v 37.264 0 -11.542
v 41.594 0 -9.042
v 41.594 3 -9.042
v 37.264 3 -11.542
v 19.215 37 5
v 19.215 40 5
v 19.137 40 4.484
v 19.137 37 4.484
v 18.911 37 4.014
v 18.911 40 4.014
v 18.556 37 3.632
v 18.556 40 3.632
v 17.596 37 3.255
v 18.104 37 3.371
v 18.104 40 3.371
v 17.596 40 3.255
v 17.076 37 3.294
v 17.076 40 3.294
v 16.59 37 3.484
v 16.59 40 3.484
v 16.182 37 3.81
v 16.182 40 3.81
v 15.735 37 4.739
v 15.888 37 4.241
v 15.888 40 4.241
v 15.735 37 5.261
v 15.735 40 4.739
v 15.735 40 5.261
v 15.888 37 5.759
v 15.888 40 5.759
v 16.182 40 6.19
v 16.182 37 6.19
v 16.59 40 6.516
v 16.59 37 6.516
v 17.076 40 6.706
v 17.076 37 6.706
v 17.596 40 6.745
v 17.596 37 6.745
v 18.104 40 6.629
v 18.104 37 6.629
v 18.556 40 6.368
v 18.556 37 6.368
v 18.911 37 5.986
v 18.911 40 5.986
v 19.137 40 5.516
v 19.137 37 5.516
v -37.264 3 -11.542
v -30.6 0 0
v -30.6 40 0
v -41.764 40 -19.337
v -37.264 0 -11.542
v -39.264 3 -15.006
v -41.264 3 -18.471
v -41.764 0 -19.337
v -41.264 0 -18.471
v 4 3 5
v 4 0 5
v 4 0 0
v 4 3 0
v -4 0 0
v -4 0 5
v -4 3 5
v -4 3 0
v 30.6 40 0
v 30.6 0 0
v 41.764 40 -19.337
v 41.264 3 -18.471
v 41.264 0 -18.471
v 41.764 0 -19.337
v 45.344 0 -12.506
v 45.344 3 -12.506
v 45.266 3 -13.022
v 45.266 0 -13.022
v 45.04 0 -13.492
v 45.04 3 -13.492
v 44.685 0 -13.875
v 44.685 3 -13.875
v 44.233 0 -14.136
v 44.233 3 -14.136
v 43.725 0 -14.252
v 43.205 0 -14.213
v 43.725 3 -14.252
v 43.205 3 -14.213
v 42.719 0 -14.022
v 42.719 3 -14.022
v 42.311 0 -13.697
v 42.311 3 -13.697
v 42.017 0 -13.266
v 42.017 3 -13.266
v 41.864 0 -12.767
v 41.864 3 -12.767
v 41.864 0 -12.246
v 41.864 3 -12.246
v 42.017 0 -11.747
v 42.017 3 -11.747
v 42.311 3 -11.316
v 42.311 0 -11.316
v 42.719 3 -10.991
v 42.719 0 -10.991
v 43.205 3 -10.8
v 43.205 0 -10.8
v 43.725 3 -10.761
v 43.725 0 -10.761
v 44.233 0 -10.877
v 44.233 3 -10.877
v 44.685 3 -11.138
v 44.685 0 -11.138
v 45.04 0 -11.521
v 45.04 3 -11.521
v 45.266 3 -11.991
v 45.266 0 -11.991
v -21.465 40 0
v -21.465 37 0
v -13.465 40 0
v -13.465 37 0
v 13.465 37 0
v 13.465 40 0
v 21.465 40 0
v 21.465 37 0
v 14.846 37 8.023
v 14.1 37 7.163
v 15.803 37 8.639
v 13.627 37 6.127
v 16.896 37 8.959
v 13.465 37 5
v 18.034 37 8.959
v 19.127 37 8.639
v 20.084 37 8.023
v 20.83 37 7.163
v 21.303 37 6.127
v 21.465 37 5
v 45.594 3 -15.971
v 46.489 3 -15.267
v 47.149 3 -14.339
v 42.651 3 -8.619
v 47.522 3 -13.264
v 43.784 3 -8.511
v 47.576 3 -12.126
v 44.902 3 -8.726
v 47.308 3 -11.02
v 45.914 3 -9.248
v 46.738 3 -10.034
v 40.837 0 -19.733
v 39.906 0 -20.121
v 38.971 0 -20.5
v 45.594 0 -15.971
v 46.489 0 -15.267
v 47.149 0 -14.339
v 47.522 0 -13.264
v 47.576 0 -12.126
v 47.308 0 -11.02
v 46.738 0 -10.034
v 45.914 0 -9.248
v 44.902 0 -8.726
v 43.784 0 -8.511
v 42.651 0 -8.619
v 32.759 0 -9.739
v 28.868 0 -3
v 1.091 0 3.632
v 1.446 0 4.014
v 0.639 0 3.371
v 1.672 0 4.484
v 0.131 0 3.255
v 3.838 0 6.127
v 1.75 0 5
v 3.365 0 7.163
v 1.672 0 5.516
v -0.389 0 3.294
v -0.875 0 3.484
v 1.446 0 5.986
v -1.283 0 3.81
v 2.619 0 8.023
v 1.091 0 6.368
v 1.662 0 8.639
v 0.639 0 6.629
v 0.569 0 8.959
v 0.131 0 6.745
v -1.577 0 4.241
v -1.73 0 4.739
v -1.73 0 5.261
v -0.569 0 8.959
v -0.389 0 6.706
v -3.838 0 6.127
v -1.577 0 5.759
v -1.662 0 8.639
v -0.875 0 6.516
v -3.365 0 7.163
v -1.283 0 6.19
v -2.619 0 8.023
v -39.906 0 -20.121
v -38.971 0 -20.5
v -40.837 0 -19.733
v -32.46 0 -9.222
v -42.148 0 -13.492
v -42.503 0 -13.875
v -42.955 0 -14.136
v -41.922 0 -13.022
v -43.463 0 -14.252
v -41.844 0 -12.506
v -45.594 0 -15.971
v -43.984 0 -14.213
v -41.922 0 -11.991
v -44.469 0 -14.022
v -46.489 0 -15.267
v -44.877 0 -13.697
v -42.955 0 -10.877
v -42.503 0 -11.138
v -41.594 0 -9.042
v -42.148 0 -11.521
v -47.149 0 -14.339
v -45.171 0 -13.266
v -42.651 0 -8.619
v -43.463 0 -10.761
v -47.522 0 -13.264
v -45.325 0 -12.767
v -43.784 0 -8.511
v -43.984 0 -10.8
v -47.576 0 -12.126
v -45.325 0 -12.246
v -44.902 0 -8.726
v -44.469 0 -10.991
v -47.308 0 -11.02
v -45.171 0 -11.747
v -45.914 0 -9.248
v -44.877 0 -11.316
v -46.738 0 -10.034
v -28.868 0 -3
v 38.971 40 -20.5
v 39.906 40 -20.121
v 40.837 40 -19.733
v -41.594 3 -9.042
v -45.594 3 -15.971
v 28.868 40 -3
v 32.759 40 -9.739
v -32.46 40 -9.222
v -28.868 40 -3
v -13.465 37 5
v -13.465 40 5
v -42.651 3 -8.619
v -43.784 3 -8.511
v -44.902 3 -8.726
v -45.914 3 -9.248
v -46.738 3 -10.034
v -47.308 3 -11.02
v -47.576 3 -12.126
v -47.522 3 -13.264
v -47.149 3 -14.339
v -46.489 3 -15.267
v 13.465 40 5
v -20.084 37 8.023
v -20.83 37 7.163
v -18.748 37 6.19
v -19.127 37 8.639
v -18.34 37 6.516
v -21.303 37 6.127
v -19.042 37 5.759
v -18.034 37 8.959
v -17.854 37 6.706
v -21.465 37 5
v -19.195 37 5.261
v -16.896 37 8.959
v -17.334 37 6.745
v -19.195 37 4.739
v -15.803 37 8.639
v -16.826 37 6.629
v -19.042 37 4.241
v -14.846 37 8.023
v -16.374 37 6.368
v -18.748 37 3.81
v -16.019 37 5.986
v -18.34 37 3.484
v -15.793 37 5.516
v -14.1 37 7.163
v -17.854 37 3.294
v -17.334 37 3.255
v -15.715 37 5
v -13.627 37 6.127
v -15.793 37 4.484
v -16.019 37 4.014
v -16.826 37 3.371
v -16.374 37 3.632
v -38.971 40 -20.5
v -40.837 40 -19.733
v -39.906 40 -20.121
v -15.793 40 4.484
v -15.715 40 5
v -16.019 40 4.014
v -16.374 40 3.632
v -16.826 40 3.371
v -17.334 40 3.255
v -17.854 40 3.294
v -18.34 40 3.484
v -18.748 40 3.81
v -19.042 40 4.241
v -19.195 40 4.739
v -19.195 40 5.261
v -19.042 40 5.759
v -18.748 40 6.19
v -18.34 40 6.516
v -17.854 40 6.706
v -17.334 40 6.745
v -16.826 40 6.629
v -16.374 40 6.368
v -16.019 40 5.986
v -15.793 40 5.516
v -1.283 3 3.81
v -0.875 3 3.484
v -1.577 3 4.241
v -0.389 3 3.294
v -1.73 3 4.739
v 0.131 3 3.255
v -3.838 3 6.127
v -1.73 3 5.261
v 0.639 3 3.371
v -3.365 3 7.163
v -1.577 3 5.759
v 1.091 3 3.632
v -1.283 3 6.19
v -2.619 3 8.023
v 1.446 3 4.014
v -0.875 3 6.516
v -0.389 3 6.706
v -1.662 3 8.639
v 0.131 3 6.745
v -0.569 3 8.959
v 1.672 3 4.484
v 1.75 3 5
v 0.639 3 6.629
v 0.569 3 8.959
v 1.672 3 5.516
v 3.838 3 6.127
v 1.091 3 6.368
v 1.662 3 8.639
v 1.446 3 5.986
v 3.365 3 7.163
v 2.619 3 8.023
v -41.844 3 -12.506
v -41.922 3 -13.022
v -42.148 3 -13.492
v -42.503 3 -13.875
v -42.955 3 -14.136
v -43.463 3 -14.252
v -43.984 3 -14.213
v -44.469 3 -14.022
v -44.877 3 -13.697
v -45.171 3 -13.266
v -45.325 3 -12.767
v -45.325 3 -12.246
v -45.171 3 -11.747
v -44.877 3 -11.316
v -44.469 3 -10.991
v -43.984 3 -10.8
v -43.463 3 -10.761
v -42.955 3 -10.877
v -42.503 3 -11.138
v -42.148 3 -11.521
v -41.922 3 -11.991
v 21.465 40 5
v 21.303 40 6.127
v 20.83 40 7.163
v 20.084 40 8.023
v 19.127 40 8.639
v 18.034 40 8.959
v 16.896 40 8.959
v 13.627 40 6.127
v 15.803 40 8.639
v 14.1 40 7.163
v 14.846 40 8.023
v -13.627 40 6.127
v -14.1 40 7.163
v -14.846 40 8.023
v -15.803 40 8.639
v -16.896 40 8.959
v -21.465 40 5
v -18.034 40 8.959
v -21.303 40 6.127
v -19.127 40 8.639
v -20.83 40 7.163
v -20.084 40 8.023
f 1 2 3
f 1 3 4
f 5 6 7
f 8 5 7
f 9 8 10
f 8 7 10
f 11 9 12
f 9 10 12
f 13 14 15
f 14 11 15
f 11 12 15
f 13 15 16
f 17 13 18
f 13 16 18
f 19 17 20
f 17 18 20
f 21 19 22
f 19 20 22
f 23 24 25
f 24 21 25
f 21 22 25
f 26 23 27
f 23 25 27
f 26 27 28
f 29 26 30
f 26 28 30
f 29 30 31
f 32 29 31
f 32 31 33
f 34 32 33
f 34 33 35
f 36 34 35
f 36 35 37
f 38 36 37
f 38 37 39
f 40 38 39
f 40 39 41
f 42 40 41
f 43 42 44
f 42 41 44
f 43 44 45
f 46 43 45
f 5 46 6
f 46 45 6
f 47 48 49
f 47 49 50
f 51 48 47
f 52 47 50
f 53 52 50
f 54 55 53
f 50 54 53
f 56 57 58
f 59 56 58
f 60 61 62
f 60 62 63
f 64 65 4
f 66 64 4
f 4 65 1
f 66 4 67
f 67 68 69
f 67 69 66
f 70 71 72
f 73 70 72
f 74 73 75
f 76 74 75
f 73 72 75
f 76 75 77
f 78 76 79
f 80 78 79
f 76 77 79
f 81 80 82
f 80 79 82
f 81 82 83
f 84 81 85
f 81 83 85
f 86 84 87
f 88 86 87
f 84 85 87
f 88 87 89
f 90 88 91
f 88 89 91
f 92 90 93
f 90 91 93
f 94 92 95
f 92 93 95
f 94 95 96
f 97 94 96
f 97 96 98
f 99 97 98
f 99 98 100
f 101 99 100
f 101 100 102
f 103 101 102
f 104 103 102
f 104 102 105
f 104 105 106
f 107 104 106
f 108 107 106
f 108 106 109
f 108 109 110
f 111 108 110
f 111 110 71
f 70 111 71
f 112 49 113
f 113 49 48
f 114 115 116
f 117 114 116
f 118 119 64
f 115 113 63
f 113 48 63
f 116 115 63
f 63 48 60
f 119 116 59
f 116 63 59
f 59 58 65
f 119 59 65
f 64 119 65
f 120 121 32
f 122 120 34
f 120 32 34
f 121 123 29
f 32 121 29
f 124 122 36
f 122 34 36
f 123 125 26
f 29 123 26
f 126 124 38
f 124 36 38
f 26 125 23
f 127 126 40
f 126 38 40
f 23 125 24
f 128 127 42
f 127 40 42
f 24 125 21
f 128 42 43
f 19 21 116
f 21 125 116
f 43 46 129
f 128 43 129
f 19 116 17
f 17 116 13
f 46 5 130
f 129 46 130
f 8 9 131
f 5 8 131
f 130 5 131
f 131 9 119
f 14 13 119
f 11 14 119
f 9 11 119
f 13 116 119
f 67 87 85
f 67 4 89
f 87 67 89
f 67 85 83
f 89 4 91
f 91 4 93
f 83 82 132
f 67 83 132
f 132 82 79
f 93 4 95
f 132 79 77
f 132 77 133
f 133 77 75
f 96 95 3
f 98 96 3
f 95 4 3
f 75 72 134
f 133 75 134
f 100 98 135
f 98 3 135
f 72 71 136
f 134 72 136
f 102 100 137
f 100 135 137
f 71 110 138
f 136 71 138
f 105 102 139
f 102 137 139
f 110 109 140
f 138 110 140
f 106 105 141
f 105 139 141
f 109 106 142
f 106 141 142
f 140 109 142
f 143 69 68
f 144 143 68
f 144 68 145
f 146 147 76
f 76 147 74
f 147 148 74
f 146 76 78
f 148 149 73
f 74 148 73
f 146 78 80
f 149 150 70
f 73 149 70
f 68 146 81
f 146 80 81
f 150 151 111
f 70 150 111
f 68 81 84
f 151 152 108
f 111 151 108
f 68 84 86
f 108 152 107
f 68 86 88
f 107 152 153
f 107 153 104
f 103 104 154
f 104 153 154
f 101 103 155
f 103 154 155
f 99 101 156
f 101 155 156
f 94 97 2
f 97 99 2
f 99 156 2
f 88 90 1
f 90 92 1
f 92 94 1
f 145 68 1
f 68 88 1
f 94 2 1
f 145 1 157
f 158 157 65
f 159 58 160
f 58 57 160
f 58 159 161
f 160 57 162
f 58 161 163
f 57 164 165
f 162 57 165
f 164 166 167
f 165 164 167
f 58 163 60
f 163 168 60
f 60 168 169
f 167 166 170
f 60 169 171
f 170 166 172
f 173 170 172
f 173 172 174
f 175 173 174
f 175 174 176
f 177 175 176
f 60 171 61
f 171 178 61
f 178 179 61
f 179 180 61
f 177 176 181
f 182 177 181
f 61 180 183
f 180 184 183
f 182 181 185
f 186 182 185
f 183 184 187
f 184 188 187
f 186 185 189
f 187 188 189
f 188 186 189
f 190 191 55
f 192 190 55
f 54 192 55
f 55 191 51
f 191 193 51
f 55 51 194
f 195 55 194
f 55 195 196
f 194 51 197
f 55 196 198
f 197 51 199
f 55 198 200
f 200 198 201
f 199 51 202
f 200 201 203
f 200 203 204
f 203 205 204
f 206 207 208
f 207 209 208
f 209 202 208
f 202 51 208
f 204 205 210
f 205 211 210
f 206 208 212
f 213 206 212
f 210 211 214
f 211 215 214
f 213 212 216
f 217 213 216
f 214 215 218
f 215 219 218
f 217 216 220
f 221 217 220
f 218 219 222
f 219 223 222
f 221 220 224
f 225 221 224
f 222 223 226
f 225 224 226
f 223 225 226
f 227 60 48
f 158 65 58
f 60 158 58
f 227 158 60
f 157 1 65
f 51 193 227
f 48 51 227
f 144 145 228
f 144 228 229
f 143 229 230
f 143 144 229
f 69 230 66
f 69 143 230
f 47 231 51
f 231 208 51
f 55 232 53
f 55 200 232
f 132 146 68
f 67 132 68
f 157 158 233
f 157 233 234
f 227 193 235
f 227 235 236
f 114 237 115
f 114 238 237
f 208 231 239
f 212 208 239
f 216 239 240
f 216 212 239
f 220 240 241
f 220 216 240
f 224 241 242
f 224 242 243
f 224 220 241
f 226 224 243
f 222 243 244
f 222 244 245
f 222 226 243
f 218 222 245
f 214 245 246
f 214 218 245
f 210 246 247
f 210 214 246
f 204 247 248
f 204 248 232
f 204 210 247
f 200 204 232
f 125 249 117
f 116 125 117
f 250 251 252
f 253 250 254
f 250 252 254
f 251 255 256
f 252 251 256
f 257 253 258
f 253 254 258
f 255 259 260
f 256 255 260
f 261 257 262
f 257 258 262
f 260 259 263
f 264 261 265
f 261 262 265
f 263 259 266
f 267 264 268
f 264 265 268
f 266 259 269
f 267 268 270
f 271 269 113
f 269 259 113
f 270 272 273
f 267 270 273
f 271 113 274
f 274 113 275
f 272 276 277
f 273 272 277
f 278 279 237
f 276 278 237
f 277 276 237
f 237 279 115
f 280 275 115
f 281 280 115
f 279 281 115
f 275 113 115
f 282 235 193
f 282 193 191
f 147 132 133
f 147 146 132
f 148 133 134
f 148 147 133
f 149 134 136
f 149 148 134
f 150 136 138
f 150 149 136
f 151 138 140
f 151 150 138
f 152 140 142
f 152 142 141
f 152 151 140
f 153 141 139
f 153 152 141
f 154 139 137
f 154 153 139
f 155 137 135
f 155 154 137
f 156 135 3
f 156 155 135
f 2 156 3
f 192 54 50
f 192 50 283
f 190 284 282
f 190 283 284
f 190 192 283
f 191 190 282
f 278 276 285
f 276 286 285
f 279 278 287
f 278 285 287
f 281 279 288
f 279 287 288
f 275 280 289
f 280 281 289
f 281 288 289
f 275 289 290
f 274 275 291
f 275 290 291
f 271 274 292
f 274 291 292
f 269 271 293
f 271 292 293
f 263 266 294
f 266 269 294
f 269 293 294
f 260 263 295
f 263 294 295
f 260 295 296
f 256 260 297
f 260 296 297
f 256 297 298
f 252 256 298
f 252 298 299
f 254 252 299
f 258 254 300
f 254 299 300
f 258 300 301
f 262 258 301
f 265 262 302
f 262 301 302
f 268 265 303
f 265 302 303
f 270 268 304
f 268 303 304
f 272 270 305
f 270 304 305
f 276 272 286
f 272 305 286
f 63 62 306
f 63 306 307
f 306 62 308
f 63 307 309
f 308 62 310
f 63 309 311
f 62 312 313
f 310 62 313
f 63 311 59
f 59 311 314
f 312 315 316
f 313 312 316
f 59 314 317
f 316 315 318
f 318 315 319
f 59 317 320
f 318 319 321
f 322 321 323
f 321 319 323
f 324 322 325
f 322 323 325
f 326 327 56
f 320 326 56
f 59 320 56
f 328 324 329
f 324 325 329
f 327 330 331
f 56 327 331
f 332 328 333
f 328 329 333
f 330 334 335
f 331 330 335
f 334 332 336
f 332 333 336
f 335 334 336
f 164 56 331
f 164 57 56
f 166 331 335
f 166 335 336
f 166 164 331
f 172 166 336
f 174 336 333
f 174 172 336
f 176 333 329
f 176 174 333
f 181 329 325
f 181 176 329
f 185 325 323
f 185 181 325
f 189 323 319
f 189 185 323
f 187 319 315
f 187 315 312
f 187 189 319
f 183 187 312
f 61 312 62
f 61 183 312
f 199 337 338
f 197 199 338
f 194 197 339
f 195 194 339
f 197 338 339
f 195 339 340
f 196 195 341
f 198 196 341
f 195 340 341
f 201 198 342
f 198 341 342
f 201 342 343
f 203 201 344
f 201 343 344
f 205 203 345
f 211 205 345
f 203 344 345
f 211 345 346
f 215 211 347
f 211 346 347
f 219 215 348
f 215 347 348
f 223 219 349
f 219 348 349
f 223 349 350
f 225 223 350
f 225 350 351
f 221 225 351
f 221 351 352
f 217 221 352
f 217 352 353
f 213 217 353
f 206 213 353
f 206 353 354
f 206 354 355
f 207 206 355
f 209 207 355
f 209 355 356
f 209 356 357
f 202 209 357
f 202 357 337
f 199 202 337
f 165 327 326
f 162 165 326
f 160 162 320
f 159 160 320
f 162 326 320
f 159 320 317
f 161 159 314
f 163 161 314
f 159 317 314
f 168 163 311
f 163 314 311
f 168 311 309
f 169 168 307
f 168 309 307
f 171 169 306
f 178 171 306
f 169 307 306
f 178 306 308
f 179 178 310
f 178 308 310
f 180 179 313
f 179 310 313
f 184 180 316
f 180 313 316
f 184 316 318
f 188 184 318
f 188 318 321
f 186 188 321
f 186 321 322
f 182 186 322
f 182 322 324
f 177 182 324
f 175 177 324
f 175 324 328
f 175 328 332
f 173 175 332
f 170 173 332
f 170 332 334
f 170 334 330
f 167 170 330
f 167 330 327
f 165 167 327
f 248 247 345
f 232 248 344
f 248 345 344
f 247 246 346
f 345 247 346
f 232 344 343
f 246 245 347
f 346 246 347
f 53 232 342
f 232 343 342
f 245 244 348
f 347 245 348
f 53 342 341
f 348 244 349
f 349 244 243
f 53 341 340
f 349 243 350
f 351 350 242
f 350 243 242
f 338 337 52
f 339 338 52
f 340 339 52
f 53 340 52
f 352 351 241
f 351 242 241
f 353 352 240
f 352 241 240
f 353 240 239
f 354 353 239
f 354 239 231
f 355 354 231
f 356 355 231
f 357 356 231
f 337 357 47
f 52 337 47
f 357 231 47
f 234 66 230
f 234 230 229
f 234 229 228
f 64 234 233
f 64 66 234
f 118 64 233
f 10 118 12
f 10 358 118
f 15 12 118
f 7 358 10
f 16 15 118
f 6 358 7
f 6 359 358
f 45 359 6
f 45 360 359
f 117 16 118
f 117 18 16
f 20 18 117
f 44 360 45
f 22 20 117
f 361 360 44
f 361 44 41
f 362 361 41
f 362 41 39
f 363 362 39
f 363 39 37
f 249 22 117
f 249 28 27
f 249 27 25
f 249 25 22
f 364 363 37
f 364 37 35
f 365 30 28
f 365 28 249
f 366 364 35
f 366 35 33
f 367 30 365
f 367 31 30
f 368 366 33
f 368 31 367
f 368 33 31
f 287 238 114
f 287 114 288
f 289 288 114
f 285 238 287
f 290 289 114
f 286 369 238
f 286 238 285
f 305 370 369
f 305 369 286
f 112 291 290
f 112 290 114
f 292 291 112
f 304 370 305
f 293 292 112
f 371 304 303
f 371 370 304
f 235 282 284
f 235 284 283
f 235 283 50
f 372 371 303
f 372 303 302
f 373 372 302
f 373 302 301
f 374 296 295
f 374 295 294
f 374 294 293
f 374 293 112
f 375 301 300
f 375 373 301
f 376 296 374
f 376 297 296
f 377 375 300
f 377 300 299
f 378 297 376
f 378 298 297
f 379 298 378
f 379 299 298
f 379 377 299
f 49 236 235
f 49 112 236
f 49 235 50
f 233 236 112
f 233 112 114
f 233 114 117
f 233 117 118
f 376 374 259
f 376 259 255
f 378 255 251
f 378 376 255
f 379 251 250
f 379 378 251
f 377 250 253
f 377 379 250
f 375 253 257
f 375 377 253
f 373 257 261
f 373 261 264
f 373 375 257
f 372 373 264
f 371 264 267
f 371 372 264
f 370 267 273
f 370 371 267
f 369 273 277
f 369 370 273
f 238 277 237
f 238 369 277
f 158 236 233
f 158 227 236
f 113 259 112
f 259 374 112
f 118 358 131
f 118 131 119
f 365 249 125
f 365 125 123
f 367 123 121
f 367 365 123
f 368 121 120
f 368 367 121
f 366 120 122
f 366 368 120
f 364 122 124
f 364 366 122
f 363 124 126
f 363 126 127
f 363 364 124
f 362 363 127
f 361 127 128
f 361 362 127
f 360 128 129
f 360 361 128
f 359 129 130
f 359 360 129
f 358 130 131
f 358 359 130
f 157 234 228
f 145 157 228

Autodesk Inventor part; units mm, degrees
ref_plane "YZ Plane" through (0, 0, 0) normal (1, 0, 0) x (0, 1, 0)
ref_plane "XZ Plane" through (0, 0, 0) normal (0, 1, 0) x (-1, 0, 0)
ref_plane "XY Plane" through (0, 0, 0) normal (0, 0, 1) x (1, 0, 0)
sketch "Sketch1" plane through (0, 0, 0) normal (0, 1, 0) x (-1, 0, 0)
  line L0 (0, 0) -> (-30.6, 0)
  line L1 (0, 0) -> (30.6, 0)
  line L2 (30.6, 0) -> (41.764, -19.3366)
  line L3 (30.6, 0) -> (52.928, 0) construction
  line L4 (-30.6, 0) -> (-41.764, -19.3366)
  line L5 (-30.6, 0) -> (-8.272, 0) construction
  line L6 (0, 0) -> (0, 77)
  line L7 (0, 0) -> (0, -3)
  line L8 (-35.3569, -8.2392) -> (-32.7588, -9.7392)
  line L9 (35.0582, -7.7219) -> (32.4602, -9.2219)
  line L10 (32.4602, -9.2219) -> (28.8679, -3)
  line L11 (28.8679, -3) -> (0, -3)
  line L12 (0, -3) -> (-28.8679, -3)
  line L13 (-28.8679, -3) -> (-32.7588, -9.7392)
  line L14 (-32.7588, -9.7392) -> (-38.9714, -20.4998)
  line L15 (32.4602, -9.2219) -> (38.9714, -20.4998)
  arc A0 (38.9714, -20.4998) -> (41.764, -19.3366) centre (0, 77) ccw
  arc A1 (-41.764, -19.3366) -> (-38.9714, -20.4998) centre (0, 77) ccw
  dimension "d0" = 30.6
  dimension "d1" = 30.6
  dimension "d2" = 22.328
  dimension "d3" = 60
  dimension "d4" = 22.328
  dimension "d5" = 120
  dimension "d6" = 77
  dimension "d7" = 3
  dimension "d8" = 3
  dimension "d9" = 3
extrude "Extrusion1" add sketch "Sketch1" along normal blind 40
sketch "Sketch2" plane through (0, 0, 0) normal (0, -1, 0) x (1, 0, 0)
  line L0 (0, 0) -> (0, 5)
  circle A0 centre (0, 5) radius 1.5
  line L1 (-41.764, -19.3366) -> (-39.264, -15.0065)
  line L2 (-41.764, -19.3366) -> (-30.6, 0) projected
  line L3 (-39.264, -15.0065) -> (-43.5941, -12.5065)
  arc A1 (38.9714, -20.4998) -> (41.764, -19.3366) centre (0, 77) ccw projected
  line L4 (38.9714, -20.4998) -> (39.264, -15.0065)
  line L5 (30.6, 0) -> (41.764, -19.3366) projected
  line L6 (41.764, -19.3366) -> (39.264, -15.0065)
  line L7 (39.264, -15.0065) -> (43.5941, -12.5065)
  circle A2 centre (43.5941, -12.5065) radius 1.5
  circle A3 centre (-43.5941, -12.5065) radius 1.5
  circle A4 centre (-43.5941, -12.5065) radius 4
  circle A5 centre (0, 5) radius 4
  circle A6 centre (43.5941, -12.5065) radius 4
  line L8 (43.5941, -12.5065) -> (45.5941, -15.9706)
  line L9 (45.5941, -15.9706) -> (41.264, -18.4706)
  line L10 (43.5941, -12.5065) -> (41.5941, -9.0424)
  line L11 (41.5941, -9.0424) -> (37.264, -11.5424)
  line L12 (4, 5) -> (4, 0)
  line L13 (-30.6, 0) -> (30.6, 0) projected
  line L14 (-4, 5) -> (-4, 0)
  line L15 (-43.5941, -12.5065) -> (-45.5941, -15.9706)
  line L16 (-45.5941, -15.9706) -> (-41.264, -18.4706)
  line L17 (-41.764, -19.3366) -> (-30.6, 0) projected
  line L18 (-43.5941, -12.5065) -> (-41.5941, -9.0424)
  line L19 (-41.5941, -9.0424) -> (-37.264, -11.5424)
  dimension "d12" = 5
  dimension "d13" = 3
  dimension "d14" = 5
  dimension "d15" = 5
  dimension "d16" = 5.5011
  dimension "d17" = 5
  dimension "d18" = 3
  dimension "d19" = 8
  dimension "d20" = 8
  dimension "d21" = 8
extrude "Extrusion2" add sketch "Sketch2" against normal blind 3 contours L13 L14 A5 L0 | L0 A5 L12 L13 | A5 | L16 A4 L3 L1 | L3 A4 L19 L2 | L15 A3 L3 A4 | A4 L18 A3 L15 | L3 A3 L18 A4 | L15 L3 A3 | A3 L18 L15 | L3 L18 A3 | L7 A6 L9 L5 | L5 L11 A6 L7 | A6 L10 A2 L7 | L7 A2 L8 A6 | L8 A2 L10 A6 | A2 L10 L7 | L7 L8 A2 | L8 L10 A2
sketch "Sketch3" plane through (0, 3, 0) normal (0, 1, 0) x (1, 0, 0)
  arc A0 (41.5941, 9.0424) -> (45.5941, 15.9706) centre (43.5941, 12.5065) ccw projected
  circle A1 centre (43.5941, 12.5065) radius 1.5
  arc A2 (-45.5941, 15.9706) -> (-41.5941, 9.0424) centre (-43.5941, 12.5065) ccw projected
  circle A3 centre (-43.5941, 12.5065) radius 1.5
  point P0 (0, 0)
  dimension "d24" = 3
extrude "Extrusion3" cut sketch "Sketch3" against normal blind 3
sketch "Sketch4" plane through (-30.6, 40, 0) normal (0, 0, 1) x (1, 0, 0)
  point P0 (30.6, -40)
sketch "Sketch5" plane through (0, 40, 0) normal (0, 1, 0) x (1, 0, 0)
  circle A0 centre (0, -5) radius 1.5 projected
  line L0 (0, -5) -> (17.465, -5)
  line L1 (0, -5) -> (-17.465, -5)
  circle A1 centre (-17.465, -5) radius 1.75
  circle A2 centre (17.465, -5) radius 1.75
  line L2 (-17.465, -5) -> (-21.465, -5)
  line L3 (-21.465, -5) -> (-21.465, 0)
  line L4 (-17.465, -5) -> (-13.465, -5)
  line L5 (-13.465, -5) -> (-13.465, 0)
  circle A3 centre (-17.465, -5) radius 4
  line L6 (17.465, -5) -> (13.465, -5)
  line L7 (13.465, -5) -> (13.465, 0)
  line L8 (-30.6, 0) -> (30.6, 0) projected
  line L9 (17.465, -5) -> (21.465, -5)
  line L10 (21.465, -5) -> (21.465, 0)
  circle A4 centre (17.465, -5) radius 4
  point P0 (0, 0)
  dimension "d27" = 17.465
  dimension "d28" = 17.465
  dimension "d29" = 3.5
  dimension "d30" = 4
  dimension "d31" = 4
  dimension "d32" = 4
  dimension "d33" = 4
extrude "Extrusion4" add sketch "Sketch5" against normal blind 3 contours A4 L9 A2 L0 | L7 L8 L10 A4 | L0 A2 L9 A4 | A3 L2 A1 L1 | A3 L3 L8 L5 | L1 A1 L2 A3 | A2 L9 L0 | L1 L2 A1 picked at (18.233, -4.1331) picked at (-16.697, -4.1331)
sketch "Sketch6" plane through (0, 40, 0) normal (0, 1, 0) x (1, 0, 0)
  arc A0 (-19.215, -5) -> (-15.715, -5) centre (-17.465, -5) ccw projected
  line L0 (-19.215, -5) -> (-15.715, -5) projected
  circle A1 centre (-17.465, -5) radius 1.75
  arc A2 (15.715, -5) -> (19.215, -5) centre (17.465, -5) ccw projected
  line L1 (15.715, -5) -> (19.215, -5) projected
  circle A3 centre (17.465, -5) radius 1.75
  point P0 (0, 0)
extrude "Extrusion5" cut sketch "Sketch6" against normal blind 3 contours A1 L0 | A3 L1
sketch "Sketch7" plane through (0, 3, 0) normal (0, 1, 0) x (1, 0, 0)
  circle A0 centre (0, -5) radius 1.5 projected
  circle A1 centre (0, -5) radius 1.75
  circle A2 centre (43.5941, 12.5065) radius 1.5 projected
  circle A3 centre (43.5941, 12.5065) radius 1.75
  circle A4 centre (-43.5941, 12.5065) radius 1.5 projected
  circle A5 centre (-43.5941, 12.5065) radius 1.75
  point P0 (0, 0)
  dimension "d38" = 3.5
  dimension "d39" = 3.5
  dimension "d40" = 3.5
extrude "Extrusion6" cut sketch "Sketch7" against normal blind 3 contours A1 | A3 | A4 | A5
properties part number "Capcture Zone2"
